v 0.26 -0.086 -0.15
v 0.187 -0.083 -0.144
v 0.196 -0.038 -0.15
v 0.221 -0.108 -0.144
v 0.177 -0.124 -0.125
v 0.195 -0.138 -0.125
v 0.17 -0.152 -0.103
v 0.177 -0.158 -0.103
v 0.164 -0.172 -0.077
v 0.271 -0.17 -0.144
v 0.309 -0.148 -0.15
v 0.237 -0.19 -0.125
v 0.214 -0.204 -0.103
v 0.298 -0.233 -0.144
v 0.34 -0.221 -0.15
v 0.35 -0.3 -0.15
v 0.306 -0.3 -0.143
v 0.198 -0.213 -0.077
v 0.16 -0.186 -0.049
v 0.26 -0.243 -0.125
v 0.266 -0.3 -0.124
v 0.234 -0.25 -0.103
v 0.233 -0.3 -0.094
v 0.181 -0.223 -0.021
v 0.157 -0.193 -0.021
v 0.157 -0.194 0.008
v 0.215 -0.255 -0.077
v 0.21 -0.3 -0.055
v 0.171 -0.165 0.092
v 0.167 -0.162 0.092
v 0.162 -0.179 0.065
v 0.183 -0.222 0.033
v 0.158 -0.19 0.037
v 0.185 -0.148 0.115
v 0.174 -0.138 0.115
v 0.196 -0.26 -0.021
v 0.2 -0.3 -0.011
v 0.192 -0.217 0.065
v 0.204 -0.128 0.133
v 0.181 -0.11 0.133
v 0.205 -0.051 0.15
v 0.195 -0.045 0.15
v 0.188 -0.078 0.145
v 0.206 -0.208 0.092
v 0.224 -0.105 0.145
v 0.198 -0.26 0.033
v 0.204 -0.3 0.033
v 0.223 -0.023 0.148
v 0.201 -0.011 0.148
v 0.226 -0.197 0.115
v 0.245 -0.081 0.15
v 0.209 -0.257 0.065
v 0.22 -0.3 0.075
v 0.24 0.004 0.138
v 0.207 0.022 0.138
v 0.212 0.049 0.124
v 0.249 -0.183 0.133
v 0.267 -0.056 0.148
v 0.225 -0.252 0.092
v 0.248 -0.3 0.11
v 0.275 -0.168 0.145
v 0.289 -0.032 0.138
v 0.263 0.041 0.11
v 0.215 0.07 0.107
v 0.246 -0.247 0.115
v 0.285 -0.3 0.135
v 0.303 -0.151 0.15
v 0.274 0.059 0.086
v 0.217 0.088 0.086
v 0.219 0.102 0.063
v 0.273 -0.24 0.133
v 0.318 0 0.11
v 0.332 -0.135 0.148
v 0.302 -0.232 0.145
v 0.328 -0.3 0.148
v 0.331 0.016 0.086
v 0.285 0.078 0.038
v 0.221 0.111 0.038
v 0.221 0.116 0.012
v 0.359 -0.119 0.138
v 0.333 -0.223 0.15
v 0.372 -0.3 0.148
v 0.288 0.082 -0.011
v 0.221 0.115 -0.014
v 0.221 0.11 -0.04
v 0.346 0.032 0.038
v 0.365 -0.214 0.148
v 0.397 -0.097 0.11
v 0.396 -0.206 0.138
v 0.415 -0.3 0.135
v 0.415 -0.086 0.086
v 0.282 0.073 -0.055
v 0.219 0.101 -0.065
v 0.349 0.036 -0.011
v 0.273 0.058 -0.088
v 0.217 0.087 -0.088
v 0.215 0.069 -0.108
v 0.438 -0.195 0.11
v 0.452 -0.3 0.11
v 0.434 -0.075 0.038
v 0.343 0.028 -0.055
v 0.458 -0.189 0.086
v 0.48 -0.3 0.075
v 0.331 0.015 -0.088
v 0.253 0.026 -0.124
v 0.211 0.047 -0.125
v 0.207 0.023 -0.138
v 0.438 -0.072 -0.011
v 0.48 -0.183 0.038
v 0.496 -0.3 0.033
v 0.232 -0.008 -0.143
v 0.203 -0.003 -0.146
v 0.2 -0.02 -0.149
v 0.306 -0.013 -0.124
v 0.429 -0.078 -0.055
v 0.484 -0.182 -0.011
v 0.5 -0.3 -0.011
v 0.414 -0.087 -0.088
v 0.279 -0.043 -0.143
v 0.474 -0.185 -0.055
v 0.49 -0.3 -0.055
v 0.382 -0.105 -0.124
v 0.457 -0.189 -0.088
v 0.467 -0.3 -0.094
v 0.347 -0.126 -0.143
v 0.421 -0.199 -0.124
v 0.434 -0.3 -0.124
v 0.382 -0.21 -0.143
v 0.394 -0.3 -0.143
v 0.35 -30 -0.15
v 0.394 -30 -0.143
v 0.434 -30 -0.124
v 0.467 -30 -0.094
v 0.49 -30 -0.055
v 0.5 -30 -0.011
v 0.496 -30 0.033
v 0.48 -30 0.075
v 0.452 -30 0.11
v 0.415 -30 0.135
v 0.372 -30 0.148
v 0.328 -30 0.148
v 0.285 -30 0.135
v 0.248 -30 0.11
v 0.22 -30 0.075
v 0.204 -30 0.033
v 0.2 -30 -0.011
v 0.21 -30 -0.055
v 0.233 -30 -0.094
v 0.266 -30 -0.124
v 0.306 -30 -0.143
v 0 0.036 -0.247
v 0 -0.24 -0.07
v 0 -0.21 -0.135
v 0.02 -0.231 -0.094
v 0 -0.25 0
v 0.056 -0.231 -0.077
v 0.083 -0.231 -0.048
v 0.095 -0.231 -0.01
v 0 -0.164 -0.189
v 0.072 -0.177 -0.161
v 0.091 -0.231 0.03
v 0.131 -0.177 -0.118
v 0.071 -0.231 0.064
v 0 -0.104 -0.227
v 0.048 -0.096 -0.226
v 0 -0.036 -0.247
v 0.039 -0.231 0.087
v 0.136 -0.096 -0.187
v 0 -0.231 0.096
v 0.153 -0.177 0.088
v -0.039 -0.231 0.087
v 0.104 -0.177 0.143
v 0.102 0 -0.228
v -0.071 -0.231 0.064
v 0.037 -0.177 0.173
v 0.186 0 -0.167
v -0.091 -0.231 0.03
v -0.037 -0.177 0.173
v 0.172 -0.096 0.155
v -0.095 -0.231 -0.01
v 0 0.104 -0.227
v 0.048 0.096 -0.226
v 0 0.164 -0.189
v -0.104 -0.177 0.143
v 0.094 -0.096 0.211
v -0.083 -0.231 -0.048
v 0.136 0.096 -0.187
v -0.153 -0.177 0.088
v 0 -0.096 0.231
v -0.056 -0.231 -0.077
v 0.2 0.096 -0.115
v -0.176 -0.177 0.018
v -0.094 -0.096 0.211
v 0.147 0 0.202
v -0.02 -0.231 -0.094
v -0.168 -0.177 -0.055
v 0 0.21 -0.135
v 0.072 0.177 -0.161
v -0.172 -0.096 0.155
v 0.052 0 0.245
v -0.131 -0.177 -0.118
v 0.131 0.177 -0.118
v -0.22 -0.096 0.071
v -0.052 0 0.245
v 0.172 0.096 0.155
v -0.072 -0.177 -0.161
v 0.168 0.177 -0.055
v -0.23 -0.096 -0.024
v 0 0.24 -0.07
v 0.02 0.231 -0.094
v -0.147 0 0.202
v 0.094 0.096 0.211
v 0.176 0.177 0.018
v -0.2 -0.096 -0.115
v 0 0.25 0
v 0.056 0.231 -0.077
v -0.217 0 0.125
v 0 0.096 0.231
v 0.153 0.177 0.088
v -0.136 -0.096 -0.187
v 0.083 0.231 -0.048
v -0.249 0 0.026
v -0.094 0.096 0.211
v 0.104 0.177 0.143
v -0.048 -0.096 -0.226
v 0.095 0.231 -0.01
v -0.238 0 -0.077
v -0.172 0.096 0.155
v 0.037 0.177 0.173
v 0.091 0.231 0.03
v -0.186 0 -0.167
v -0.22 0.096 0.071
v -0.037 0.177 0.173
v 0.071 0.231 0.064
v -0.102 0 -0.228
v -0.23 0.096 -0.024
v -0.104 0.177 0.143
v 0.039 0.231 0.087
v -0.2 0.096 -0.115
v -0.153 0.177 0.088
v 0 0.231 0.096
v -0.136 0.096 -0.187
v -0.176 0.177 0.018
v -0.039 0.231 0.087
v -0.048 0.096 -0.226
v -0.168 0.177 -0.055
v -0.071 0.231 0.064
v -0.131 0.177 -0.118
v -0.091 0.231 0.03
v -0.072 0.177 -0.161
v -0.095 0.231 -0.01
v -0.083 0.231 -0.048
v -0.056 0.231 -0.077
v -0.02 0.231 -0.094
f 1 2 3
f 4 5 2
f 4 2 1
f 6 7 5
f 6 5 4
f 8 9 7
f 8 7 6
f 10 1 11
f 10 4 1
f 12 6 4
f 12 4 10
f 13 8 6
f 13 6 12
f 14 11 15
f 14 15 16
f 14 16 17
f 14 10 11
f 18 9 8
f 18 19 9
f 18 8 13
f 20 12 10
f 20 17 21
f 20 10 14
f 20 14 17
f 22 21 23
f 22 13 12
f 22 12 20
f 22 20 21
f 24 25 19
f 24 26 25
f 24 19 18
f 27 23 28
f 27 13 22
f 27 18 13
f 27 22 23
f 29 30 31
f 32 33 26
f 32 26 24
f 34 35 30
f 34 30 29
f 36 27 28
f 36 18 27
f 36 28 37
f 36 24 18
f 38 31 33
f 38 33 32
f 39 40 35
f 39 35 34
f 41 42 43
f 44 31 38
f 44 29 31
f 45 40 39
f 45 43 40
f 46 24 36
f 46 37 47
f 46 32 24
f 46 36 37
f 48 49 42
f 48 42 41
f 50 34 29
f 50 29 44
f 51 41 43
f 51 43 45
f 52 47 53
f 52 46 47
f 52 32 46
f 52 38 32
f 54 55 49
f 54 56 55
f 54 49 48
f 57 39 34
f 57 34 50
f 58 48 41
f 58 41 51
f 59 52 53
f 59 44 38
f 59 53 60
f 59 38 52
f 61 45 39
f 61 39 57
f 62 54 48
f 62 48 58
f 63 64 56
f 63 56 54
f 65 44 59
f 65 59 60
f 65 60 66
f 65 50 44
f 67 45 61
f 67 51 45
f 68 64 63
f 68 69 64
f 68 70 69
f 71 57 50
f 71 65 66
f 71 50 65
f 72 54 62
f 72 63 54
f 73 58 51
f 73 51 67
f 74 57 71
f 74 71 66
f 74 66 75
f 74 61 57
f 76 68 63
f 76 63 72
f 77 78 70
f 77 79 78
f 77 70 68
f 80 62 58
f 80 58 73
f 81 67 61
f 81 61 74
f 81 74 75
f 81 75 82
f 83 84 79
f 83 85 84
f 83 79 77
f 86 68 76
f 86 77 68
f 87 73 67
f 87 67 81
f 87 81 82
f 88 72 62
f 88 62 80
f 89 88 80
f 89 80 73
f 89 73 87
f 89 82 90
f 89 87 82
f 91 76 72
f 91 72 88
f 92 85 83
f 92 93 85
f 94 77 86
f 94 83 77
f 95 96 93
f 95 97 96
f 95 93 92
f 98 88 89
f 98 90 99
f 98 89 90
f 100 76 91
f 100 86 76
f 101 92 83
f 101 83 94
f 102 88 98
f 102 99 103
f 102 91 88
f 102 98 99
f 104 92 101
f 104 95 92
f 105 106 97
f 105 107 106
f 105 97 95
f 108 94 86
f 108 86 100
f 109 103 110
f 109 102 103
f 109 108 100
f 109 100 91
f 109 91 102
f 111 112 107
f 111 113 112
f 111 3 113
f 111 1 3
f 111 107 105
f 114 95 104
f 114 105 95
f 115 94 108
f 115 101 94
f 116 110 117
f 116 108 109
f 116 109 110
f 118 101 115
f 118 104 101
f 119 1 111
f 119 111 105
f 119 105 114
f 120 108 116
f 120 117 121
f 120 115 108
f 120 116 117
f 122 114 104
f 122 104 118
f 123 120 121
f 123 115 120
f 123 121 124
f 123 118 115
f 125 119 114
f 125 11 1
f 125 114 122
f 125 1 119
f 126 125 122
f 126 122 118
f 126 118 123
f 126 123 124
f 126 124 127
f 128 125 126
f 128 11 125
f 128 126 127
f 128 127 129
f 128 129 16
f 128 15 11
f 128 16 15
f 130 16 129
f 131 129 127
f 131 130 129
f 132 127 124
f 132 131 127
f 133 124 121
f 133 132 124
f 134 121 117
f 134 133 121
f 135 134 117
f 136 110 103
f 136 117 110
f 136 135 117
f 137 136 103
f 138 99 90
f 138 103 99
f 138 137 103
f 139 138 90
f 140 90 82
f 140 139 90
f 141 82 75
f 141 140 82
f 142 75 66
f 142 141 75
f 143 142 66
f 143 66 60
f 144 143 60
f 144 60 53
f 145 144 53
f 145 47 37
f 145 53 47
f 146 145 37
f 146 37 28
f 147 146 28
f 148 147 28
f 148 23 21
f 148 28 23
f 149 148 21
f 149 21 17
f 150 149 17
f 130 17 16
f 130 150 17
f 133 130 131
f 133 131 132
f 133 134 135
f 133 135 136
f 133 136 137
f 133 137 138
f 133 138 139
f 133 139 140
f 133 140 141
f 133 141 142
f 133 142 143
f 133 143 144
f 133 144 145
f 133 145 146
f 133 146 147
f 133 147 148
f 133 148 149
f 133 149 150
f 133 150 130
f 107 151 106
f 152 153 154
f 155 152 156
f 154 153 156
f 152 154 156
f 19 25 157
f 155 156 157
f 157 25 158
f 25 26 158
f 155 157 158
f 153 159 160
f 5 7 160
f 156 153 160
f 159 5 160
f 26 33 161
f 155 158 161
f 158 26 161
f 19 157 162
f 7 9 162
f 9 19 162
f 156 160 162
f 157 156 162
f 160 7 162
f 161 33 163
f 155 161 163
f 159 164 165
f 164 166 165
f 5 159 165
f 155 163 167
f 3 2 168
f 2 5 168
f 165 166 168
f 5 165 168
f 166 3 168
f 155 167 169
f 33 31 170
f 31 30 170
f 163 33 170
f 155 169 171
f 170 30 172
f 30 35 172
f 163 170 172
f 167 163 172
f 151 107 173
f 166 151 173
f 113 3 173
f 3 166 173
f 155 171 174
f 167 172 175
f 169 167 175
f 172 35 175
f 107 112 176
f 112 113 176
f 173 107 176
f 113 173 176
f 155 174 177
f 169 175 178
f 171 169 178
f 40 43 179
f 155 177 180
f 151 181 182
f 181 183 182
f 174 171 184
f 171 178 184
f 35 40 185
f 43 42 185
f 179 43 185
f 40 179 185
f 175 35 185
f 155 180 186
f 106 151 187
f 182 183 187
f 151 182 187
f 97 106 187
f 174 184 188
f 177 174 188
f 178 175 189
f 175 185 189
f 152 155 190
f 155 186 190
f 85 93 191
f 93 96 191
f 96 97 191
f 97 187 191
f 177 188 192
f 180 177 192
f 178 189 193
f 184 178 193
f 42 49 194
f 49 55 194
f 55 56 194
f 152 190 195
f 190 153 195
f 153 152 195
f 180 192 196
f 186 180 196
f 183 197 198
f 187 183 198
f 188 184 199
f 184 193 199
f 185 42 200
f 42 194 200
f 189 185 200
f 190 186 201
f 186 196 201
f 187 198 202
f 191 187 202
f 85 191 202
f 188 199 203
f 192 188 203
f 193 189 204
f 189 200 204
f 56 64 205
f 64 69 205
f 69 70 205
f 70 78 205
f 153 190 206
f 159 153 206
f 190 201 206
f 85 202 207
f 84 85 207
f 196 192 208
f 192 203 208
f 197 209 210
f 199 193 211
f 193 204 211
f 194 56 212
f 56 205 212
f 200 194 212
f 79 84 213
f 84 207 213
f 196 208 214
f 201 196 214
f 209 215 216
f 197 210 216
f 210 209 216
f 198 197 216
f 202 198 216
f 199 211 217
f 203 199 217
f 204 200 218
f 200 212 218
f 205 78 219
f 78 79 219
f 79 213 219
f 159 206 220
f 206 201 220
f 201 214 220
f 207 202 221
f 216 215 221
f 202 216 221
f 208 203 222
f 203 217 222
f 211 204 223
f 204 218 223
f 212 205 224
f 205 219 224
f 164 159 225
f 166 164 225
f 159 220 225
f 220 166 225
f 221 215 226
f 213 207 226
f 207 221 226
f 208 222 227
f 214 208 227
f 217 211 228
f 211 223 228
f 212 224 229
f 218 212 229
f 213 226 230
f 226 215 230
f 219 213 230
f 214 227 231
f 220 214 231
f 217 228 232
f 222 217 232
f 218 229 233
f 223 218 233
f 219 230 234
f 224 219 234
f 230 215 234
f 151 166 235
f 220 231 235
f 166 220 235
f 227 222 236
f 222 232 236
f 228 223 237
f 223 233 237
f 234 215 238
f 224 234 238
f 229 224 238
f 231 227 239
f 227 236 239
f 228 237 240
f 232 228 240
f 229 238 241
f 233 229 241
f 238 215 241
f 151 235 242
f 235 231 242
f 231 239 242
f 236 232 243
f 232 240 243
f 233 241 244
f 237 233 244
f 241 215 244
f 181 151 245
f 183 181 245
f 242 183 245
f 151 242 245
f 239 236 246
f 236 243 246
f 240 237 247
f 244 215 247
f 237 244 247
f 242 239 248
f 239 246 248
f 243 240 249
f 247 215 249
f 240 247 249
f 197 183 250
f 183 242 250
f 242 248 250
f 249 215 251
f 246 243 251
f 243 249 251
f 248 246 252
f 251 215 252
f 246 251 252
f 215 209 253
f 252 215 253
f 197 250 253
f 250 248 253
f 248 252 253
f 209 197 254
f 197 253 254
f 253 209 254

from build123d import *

# Parameters (mm, degrees)
SKETCH1_R           = 0.15
SKETCH6_R           = 0.2
BOSS_EXTRUDE1_DEPTH = 0.15


with BuildPart() as part:
    # Sweep1: sweep along a path in Sketch3
    with BuildLine(Plane.XY) as sweep1_path:
        Line((0, 0), (0.05, 0))
        ThreePointArc((0.05, 0), (0.262132034, -0.087867966), (0.35, -0.3))
        Line((0.35, -0.3), (0.35, -30))
    # Sketch1 → Sweep1 (sweep)
    with BuildSketch(Plane(origin=(0, 0, 0), x_dir=(0, 0, -1), z_dir=(1, 0, 0))):
        Circle(SKETCH1_R)
    sweep(path=sweep1_path.line)

    # Sketch6 → Boss-Extrude1 (add)
    with BuildSketch(Plane.ZY):
        Circle(SKETCH6_R)
    extrude(amount=-BOSS_EXTRUDE1_DEPTH)

    # Sketch4 → Revolve2 (revolve)
    with BuildSketch(Plane.ZY):
        with BuildLine():
            Line((0, 0.25), (0, -0.25))
            ThreePointArc((0, -0.25), (-0.25, 0), (0, 0.25))
        make_face()
    revolve(axis=Axis((0, 0.25, 0), (0, -1, 0)))


solid = part.part
